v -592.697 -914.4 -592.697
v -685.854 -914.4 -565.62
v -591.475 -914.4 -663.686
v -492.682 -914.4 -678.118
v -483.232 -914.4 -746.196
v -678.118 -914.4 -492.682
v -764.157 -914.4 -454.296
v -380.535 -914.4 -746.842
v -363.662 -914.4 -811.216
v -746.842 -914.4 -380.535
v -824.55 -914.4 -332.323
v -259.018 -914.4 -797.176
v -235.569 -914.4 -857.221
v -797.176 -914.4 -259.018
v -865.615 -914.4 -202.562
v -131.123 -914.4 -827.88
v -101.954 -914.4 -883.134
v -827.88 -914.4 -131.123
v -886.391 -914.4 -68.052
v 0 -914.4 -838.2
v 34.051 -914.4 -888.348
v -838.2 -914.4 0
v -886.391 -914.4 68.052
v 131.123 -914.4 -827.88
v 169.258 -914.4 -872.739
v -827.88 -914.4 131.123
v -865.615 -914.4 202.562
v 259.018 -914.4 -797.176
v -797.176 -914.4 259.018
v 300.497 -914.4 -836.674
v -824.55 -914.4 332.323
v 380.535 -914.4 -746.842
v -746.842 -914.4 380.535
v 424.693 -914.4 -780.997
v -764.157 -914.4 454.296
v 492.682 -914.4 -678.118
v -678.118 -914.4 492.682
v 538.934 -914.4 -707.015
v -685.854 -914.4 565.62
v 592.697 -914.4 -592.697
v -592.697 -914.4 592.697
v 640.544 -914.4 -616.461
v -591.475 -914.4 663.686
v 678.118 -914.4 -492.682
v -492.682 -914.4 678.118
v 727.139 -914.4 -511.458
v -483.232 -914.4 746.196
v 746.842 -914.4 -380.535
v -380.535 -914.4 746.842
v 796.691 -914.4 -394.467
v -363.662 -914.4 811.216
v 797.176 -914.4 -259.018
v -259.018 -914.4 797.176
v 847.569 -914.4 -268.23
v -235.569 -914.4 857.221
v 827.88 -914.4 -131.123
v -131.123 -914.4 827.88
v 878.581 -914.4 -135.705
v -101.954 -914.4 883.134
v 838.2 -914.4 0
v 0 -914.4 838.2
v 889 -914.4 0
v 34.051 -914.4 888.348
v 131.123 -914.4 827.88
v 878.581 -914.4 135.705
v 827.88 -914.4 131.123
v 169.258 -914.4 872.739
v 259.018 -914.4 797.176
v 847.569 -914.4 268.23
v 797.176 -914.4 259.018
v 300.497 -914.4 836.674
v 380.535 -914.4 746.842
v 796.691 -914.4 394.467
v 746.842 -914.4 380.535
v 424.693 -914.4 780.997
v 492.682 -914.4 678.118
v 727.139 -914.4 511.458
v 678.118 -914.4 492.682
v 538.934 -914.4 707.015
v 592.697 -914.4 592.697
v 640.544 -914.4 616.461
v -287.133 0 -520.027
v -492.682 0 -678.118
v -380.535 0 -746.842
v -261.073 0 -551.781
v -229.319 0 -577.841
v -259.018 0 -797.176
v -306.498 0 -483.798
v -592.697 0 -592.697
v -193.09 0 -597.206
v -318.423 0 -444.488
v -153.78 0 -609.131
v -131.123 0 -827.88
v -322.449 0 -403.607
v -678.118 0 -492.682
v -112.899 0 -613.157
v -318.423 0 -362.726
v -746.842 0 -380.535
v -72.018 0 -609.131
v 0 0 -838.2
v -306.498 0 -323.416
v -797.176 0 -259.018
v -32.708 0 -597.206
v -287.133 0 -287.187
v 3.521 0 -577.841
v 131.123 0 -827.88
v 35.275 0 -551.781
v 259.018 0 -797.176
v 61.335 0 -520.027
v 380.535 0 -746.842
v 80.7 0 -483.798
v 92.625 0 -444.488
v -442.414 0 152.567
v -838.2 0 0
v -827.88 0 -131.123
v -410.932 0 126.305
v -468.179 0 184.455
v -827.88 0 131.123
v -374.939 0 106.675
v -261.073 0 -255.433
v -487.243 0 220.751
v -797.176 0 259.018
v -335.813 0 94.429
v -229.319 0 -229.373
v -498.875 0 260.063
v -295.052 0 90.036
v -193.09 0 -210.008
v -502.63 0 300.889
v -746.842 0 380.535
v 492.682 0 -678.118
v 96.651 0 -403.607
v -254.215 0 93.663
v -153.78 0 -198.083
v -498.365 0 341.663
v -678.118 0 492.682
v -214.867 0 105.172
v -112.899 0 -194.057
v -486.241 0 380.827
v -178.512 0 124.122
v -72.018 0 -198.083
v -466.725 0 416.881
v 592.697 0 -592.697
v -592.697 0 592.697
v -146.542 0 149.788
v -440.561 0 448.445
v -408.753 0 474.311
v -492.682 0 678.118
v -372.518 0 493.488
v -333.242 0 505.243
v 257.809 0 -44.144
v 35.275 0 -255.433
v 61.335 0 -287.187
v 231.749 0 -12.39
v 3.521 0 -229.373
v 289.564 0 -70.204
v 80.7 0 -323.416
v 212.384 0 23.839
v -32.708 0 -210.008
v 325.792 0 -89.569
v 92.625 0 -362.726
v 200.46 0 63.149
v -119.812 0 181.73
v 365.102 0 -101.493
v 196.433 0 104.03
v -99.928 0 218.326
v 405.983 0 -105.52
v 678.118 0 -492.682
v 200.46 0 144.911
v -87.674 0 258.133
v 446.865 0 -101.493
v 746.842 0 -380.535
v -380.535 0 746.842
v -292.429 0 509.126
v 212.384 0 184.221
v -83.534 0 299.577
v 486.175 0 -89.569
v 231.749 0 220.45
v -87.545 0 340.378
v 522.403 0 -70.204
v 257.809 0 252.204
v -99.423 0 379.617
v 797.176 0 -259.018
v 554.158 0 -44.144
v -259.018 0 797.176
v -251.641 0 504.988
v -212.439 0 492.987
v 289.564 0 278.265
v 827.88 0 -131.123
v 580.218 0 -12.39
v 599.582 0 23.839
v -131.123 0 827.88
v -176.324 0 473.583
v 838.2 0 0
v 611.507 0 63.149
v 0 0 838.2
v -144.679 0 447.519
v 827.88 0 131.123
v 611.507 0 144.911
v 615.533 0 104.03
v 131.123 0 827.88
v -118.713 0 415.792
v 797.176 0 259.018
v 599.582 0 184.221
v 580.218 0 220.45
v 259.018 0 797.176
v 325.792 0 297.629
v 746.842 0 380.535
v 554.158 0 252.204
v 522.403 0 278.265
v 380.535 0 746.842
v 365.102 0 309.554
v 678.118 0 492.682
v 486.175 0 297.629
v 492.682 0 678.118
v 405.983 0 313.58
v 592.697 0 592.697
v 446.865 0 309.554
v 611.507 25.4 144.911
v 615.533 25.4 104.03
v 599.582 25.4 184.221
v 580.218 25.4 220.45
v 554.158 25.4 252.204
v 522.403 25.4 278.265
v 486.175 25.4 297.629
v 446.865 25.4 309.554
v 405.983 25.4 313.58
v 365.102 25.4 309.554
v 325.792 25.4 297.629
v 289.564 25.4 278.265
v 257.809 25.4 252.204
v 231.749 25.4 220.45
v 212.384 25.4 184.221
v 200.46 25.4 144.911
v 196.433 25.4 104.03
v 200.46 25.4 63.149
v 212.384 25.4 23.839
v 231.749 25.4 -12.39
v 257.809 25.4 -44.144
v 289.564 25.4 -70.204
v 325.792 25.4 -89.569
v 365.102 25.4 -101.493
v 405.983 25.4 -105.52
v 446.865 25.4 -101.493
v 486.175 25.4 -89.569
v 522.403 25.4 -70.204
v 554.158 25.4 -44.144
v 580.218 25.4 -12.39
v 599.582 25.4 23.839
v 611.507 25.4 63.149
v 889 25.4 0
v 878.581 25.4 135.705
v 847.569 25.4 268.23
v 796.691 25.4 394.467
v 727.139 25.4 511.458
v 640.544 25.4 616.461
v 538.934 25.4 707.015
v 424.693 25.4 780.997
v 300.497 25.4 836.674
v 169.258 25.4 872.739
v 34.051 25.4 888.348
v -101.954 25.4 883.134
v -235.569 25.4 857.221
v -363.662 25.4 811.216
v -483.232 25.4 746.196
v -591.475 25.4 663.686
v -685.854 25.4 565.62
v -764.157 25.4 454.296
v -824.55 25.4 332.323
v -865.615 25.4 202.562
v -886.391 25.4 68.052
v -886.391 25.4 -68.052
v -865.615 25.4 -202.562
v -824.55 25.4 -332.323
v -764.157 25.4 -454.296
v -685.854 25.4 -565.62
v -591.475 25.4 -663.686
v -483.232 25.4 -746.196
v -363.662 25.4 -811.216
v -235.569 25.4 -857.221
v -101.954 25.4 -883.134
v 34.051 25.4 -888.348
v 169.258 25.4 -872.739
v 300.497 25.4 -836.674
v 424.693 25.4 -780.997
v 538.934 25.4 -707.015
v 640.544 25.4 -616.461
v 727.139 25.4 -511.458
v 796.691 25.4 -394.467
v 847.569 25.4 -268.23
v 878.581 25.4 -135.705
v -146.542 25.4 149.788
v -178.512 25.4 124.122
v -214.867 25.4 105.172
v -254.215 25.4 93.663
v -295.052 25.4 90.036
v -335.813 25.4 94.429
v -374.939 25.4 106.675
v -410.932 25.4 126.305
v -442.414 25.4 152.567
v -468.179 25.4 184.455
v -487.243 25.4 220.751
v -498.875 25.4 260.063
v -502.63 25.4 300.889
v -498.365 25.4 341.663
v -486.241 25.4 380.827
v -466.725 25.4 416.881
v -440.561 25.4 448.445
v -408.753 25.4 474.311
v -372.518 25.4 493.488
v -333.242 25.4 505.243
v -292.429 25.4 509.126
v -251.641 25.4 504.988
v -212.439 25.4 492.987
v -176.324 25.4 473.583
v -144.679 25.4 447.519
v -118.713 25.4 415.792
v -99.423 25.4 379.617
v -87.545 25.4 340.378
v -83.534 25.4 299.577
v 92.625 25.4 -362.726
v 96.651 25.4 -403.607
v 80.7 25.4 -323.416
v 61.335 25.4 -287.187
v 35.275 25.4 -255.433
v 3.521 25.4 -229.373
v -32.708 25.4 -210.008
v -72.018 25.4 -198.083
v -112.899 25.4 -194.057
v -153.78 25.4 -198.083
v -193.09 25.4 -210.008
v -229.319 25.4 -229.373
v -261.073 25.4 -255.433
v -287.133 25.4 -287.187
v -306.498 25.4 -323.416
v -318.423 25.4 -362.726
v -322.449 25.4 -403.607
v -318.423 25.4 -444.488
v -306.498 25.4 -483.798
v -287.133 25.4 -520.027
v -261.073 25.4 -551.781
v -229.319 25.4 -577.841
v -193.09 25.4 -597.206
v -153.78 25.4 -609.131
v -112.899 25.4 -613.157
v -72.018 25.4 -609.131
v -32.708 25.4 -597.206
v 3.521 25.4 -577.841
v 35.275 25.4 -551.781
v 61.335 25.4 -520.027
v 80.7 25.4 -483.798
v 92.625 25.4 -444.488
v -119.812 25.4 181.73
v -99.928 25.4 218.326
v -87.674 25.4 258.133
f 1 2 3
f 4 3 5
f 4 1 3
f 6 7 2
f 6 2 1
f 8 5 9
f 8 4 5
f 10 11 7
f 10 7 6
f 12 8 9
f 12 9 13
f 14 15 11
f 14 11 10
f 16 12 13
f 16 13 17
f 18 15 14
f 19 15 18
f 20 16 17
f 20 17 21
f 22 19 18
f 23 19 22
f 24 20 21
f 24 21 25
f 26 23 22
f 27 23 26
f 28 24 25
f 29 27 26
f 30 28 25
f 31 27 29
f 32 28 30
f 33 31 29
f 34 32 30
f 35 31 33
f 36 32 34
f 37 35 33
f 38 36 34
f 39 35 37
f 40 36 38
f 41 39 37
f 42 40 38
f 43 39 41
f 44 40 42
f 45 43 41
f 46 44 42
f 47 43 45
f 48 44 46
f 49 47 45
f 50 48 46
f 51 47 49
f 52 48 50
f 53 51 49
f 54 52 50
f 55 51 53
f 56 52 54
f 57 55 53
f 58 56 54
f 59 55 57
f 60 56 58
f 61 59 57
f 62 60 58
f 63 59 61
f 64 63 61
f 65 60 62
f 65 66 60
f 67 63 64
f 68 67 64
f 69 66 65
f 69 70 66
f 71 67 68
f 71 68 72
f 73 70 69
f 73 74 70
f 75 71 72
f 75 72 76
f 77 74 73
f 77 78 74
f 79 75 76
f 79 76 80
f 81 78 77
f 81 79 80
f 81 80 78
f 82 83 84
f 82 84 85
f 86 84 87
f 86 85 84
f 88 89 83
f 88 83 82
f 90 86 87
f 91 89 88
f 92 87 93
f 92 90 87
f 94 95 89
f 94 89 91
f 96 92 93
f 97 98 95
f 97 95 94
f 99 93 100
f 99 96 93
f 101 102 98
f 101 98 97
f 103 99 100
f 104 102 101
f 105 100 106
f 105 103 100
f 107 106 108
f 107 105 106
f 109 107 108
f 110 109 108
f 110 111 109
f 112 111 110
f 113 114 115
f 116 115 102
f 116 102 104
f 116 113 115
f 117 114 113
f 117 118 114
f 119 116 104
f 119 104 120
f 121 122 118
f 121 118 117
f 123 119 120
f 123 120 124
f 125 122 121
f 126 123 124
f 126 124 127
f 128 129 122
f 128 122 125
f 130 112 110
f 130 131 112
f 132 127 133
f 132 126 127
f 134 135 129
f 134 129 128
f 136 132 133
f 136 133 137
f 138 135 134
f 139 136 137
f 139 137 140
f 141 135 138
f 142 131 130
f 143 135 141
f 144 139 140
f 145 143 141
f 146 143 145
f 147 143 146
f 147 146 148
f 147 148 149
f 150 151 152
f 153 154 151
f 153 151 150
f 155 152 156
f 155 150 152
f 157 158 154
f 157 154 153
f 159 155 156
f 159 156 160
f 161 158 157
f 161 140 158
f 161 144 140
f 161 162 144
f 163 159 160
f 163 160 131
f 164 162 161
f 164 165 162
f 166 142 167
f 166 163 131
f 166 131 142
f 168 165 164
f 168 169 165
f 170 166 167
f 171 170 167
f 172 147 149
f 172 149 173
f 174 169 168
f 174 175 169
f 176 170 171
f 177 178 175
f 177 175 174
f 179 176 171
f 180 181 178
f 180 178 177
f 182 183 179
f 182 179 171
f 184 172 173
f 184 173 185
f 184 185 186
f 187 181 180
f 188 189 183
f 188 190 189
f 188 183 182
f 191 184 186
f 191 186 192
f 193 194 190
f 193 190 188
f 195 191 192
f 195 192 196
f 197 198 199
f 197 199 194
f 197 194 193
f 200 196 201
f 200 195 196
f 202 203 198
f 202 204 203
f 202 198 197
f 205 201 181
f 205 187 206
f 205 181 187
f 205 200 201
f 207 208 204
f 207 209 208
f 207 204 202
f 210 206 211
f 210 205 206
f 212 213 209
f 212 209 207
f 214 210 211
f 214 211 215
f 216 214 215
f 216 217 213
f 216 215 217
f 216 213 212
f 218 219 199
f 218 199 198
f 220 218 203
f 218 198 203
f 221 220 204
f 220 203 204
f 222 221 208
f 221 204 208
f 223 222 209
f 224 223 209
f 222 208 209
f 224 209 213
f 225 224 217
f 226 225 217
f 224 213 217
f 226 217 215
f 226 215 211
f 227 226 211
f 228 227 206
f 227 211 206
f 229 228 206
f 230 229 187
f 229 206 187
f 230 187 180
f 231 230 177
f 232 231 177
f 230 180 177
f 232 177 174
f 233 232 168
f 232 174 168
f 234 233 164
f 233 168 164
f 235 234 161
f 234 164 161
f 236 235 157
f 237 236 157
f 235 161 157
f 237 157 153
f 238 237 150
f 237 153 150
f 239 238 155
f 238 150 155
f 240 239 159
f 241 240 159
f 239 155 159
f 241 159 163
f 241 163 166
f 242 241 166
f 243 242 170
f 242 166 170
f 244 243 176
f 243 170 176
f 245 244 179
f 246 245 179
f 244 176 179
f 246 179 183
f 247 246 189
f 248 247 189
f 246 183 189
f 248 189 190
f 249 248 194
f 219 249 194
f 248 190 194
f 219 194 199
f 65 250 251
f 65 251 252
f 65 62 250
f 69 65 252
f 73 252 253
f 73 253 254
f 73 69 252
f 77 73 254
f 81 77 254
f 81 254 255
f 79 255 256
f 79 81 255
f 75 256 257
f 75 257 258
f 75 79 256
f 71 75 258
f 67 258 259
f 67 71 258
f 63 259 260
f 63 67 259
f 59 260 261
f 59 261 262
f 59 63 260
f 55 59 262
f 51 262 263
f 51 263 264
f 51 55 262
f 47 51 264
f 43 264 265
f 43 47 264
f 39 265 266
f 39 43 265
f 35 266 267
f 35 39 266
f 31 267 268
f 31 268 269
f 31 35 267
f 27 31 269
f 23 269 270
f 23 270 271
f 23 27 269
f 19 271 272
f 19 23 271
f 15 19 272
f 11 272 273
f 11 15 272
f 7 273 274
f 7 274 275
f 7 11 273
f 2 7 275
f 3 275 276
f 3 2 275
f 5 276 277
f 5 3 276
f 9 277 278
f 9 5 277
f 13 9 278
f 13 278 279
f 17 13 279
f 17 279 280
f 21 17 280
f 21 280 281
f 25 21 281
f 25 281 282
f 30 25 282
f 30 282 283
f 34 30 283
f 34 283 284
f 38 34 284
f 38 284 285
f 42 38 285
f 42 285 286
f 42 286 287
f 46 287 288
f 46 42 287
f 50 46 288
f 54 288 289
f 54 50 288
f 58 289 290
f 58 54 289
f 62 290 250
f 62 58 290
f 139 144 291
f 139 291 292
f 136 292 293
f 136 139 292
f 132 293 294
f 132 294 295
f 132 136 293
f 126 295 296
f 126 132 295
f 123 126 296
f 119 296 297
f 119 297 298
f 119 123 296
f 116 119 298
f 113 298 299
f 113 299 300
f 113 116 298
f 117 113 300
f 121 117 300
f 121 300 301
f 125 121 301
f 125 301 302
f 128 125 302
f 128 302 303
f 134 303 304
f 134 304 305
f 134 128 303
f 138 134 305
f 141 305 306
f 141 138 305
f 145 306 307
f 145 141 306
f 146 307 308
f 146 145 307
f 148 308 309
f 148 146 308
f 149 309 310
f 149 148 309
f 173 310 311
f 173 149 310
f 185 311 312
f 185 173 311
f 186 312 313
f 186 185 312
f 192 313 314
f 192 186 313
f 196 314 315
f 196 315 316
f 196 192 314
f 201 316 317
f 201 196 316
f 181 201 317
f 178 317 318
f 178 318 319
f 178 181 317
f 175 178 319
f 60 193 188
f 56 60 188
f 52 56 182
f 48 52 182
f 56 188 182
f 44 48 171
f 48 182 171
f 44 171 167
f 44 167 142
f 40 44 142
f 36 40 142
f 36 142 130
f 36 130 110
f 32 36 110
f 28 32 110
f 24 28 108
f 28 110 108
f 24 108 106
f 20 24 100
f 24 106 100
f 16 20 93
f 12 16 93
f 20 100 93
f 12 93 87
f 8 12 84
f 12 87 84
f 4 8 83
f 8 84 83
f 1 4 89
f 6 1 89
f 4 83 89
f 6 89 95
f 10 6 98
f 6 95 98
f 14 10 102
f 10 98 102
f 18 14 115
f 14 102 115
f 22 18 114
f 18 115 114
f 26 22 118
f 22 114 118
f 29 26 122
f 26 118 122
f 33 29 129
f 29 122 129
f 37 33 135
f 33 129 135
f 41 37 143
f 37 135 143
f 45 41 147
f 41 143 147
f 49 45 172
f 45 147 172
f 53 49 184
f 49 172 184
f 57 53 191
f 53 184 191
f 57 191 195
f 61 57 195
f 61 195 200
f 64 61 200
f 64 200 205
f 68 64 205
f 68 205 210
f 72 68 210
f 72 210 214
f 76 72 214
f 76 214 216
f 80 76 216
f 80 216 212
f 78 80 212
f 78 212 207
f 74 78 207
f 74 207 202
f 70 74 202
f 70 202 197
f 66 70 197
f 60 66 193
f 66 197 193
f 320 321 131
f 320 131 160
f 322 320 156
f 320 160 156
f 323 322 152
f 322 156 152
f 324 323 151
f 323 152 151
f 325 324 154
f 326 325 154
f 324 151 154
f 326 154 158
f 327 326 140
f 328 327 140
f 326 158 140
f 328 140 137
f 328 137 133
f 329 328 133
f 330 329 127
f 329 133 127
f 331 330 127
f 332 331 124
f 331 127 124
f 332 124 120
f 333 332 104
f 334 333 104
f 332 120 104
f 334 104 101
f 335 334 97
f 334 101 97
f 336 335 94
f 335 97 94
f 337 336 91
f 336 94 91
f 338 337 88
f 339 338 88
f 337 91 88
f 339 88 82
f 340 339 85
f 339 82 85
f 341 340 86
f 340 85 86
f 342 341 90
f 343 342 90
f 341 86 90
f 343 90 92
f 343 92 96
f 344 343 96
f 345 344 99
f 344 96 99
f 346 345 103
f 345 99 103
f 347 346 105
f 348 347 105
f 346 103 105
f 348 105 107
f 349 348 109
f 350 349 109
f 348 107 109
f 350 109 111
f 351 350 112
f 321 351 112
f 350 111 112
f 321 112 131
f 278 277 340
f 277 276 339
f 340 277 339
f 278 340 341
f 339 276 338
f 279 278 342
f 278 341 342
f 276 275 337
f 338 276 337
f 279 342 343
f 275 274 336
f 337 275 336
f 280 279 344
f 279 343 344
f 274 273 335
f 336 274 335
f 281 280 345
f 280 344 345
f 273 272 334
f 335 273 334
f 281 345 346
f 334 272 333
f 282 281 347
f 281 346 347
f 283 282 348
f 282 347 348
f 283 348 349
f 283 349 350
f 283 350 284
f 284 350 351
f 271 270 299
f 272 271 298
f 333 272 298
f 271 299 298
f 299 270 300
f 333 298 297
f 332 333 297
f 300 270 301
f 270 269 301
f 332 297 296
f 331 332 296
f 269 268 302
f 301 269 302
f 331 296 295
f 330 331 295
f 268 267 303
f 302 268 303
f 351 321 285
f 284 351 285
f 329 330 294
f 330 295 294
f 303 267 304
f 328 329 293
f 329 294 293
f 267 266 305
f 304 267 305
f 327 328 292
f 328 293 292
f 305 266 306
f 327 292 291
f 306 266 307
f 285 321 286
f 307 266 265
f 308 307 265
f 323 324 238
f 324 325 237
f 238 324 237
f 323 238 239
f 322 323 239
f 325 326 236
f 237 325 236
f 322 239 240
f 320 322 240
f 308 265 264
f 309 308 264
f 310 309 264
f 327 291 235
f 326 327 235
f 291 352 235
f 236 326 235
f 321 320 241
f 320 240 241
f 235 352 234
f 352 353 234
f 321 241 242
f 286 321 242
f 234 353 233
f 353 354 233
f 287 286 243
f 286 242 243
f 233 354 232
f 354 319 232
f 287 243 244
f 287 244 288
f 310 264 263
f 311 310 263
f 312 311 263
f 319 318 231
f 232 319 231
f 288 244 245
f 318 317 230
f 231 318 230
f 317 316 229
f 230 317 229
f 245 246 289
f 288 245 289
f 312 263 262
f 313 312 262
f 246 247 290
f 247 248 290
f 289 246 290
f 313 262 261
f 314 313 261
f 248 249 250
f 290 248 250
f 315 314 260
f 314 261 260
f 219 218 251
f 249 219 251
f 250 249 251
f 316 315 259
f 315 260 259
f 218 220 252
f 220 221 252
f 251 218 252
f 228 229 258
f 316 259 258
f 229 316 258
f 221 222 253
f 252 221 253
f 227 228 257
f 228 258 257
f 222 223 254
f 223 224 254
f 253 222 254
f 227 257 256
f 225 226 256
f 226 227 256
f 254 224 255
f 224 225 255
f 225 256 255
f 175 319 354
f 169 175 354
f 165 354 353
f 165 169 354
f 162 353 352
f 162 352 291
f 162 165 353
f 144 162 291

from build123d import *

# Parameters (mm, degrees)
F0_R     = 889
F1_DEPTH = 914.4
F0_R_2   = 209.55
F2_DEPTH = 25.4


with BuildPart() as f1:
    # F0 (on Front) → F1 (new body)
    with BuildSketch(Plane.XZ):
        Circle(F0_R)
        with BuildLine():
            ThreePointArc((-586.1689197433, 599.1537678485), (325.0018857416, 772.6273450147), (838.2, 0))
            ThreePointArc((838.2, 0), (-325.0018857416, -772.6273450147), (-586.1689197433, 599.1537678485))
        make_face(mode=Mode.SUBTRACT)
    extrude(amount=F1_DEPTH)

    # F0 (on Front) → F2 (join)
    with BuildSketch(Plane.XZ):
        Circle(F0_R)
        with BuildLine():
            ThreePointArc((-586.1689197433, 599.1537678485), (325.0018857416, 772.6273450147), (838.2, 0))
            ThreePointArc((838.2, 0), (-325.0018857416, -772.6273450147), (-586.1689197433, 599.1537678485))
        make_face(mode=Mode.SUBTRACT)
        with BuildLine():
            ThreePointArc((-586.1689197433, 599.1537678485), (-325.0018857416, -772.6273450147), (838.2, 0))
            ThreePointArc((838.2, 0), (325.0018857416, 772.6273450147), (-586.1689197433, 599.1537678485))
        make_face()
        with Locations((-112.8989619291, -403.6070296654)):
            Circle(F0_R_2, mode=Mode.SUBTRACT)
        with BuildLine():
            ThreePointArc((-146.5422299358, 149.7884419621), (-442.8729018337, 153.0346539884), (-439.6266898075, 449.3653258863))
            ThreePointArc((-439.6266898075, 449.3653258863), (-211.8339884362, 492.7337201779), (-83.5344598716, 299.5768839242))
            ThreePointArc((-83.5344598716, 299.5768839242), (-99.927623618, 218.3264124888), (-146.5422299358, 149.7884419621))
        make_face(mode=Mode.SUBTRACT)
        with Locations((405.9834218008, 104.0301457412)):
            Circle(F0_R_2, mode=Mode.SUBTRACT)
    extrude(amount=-F2_DEPTH)


solid = f1.part
